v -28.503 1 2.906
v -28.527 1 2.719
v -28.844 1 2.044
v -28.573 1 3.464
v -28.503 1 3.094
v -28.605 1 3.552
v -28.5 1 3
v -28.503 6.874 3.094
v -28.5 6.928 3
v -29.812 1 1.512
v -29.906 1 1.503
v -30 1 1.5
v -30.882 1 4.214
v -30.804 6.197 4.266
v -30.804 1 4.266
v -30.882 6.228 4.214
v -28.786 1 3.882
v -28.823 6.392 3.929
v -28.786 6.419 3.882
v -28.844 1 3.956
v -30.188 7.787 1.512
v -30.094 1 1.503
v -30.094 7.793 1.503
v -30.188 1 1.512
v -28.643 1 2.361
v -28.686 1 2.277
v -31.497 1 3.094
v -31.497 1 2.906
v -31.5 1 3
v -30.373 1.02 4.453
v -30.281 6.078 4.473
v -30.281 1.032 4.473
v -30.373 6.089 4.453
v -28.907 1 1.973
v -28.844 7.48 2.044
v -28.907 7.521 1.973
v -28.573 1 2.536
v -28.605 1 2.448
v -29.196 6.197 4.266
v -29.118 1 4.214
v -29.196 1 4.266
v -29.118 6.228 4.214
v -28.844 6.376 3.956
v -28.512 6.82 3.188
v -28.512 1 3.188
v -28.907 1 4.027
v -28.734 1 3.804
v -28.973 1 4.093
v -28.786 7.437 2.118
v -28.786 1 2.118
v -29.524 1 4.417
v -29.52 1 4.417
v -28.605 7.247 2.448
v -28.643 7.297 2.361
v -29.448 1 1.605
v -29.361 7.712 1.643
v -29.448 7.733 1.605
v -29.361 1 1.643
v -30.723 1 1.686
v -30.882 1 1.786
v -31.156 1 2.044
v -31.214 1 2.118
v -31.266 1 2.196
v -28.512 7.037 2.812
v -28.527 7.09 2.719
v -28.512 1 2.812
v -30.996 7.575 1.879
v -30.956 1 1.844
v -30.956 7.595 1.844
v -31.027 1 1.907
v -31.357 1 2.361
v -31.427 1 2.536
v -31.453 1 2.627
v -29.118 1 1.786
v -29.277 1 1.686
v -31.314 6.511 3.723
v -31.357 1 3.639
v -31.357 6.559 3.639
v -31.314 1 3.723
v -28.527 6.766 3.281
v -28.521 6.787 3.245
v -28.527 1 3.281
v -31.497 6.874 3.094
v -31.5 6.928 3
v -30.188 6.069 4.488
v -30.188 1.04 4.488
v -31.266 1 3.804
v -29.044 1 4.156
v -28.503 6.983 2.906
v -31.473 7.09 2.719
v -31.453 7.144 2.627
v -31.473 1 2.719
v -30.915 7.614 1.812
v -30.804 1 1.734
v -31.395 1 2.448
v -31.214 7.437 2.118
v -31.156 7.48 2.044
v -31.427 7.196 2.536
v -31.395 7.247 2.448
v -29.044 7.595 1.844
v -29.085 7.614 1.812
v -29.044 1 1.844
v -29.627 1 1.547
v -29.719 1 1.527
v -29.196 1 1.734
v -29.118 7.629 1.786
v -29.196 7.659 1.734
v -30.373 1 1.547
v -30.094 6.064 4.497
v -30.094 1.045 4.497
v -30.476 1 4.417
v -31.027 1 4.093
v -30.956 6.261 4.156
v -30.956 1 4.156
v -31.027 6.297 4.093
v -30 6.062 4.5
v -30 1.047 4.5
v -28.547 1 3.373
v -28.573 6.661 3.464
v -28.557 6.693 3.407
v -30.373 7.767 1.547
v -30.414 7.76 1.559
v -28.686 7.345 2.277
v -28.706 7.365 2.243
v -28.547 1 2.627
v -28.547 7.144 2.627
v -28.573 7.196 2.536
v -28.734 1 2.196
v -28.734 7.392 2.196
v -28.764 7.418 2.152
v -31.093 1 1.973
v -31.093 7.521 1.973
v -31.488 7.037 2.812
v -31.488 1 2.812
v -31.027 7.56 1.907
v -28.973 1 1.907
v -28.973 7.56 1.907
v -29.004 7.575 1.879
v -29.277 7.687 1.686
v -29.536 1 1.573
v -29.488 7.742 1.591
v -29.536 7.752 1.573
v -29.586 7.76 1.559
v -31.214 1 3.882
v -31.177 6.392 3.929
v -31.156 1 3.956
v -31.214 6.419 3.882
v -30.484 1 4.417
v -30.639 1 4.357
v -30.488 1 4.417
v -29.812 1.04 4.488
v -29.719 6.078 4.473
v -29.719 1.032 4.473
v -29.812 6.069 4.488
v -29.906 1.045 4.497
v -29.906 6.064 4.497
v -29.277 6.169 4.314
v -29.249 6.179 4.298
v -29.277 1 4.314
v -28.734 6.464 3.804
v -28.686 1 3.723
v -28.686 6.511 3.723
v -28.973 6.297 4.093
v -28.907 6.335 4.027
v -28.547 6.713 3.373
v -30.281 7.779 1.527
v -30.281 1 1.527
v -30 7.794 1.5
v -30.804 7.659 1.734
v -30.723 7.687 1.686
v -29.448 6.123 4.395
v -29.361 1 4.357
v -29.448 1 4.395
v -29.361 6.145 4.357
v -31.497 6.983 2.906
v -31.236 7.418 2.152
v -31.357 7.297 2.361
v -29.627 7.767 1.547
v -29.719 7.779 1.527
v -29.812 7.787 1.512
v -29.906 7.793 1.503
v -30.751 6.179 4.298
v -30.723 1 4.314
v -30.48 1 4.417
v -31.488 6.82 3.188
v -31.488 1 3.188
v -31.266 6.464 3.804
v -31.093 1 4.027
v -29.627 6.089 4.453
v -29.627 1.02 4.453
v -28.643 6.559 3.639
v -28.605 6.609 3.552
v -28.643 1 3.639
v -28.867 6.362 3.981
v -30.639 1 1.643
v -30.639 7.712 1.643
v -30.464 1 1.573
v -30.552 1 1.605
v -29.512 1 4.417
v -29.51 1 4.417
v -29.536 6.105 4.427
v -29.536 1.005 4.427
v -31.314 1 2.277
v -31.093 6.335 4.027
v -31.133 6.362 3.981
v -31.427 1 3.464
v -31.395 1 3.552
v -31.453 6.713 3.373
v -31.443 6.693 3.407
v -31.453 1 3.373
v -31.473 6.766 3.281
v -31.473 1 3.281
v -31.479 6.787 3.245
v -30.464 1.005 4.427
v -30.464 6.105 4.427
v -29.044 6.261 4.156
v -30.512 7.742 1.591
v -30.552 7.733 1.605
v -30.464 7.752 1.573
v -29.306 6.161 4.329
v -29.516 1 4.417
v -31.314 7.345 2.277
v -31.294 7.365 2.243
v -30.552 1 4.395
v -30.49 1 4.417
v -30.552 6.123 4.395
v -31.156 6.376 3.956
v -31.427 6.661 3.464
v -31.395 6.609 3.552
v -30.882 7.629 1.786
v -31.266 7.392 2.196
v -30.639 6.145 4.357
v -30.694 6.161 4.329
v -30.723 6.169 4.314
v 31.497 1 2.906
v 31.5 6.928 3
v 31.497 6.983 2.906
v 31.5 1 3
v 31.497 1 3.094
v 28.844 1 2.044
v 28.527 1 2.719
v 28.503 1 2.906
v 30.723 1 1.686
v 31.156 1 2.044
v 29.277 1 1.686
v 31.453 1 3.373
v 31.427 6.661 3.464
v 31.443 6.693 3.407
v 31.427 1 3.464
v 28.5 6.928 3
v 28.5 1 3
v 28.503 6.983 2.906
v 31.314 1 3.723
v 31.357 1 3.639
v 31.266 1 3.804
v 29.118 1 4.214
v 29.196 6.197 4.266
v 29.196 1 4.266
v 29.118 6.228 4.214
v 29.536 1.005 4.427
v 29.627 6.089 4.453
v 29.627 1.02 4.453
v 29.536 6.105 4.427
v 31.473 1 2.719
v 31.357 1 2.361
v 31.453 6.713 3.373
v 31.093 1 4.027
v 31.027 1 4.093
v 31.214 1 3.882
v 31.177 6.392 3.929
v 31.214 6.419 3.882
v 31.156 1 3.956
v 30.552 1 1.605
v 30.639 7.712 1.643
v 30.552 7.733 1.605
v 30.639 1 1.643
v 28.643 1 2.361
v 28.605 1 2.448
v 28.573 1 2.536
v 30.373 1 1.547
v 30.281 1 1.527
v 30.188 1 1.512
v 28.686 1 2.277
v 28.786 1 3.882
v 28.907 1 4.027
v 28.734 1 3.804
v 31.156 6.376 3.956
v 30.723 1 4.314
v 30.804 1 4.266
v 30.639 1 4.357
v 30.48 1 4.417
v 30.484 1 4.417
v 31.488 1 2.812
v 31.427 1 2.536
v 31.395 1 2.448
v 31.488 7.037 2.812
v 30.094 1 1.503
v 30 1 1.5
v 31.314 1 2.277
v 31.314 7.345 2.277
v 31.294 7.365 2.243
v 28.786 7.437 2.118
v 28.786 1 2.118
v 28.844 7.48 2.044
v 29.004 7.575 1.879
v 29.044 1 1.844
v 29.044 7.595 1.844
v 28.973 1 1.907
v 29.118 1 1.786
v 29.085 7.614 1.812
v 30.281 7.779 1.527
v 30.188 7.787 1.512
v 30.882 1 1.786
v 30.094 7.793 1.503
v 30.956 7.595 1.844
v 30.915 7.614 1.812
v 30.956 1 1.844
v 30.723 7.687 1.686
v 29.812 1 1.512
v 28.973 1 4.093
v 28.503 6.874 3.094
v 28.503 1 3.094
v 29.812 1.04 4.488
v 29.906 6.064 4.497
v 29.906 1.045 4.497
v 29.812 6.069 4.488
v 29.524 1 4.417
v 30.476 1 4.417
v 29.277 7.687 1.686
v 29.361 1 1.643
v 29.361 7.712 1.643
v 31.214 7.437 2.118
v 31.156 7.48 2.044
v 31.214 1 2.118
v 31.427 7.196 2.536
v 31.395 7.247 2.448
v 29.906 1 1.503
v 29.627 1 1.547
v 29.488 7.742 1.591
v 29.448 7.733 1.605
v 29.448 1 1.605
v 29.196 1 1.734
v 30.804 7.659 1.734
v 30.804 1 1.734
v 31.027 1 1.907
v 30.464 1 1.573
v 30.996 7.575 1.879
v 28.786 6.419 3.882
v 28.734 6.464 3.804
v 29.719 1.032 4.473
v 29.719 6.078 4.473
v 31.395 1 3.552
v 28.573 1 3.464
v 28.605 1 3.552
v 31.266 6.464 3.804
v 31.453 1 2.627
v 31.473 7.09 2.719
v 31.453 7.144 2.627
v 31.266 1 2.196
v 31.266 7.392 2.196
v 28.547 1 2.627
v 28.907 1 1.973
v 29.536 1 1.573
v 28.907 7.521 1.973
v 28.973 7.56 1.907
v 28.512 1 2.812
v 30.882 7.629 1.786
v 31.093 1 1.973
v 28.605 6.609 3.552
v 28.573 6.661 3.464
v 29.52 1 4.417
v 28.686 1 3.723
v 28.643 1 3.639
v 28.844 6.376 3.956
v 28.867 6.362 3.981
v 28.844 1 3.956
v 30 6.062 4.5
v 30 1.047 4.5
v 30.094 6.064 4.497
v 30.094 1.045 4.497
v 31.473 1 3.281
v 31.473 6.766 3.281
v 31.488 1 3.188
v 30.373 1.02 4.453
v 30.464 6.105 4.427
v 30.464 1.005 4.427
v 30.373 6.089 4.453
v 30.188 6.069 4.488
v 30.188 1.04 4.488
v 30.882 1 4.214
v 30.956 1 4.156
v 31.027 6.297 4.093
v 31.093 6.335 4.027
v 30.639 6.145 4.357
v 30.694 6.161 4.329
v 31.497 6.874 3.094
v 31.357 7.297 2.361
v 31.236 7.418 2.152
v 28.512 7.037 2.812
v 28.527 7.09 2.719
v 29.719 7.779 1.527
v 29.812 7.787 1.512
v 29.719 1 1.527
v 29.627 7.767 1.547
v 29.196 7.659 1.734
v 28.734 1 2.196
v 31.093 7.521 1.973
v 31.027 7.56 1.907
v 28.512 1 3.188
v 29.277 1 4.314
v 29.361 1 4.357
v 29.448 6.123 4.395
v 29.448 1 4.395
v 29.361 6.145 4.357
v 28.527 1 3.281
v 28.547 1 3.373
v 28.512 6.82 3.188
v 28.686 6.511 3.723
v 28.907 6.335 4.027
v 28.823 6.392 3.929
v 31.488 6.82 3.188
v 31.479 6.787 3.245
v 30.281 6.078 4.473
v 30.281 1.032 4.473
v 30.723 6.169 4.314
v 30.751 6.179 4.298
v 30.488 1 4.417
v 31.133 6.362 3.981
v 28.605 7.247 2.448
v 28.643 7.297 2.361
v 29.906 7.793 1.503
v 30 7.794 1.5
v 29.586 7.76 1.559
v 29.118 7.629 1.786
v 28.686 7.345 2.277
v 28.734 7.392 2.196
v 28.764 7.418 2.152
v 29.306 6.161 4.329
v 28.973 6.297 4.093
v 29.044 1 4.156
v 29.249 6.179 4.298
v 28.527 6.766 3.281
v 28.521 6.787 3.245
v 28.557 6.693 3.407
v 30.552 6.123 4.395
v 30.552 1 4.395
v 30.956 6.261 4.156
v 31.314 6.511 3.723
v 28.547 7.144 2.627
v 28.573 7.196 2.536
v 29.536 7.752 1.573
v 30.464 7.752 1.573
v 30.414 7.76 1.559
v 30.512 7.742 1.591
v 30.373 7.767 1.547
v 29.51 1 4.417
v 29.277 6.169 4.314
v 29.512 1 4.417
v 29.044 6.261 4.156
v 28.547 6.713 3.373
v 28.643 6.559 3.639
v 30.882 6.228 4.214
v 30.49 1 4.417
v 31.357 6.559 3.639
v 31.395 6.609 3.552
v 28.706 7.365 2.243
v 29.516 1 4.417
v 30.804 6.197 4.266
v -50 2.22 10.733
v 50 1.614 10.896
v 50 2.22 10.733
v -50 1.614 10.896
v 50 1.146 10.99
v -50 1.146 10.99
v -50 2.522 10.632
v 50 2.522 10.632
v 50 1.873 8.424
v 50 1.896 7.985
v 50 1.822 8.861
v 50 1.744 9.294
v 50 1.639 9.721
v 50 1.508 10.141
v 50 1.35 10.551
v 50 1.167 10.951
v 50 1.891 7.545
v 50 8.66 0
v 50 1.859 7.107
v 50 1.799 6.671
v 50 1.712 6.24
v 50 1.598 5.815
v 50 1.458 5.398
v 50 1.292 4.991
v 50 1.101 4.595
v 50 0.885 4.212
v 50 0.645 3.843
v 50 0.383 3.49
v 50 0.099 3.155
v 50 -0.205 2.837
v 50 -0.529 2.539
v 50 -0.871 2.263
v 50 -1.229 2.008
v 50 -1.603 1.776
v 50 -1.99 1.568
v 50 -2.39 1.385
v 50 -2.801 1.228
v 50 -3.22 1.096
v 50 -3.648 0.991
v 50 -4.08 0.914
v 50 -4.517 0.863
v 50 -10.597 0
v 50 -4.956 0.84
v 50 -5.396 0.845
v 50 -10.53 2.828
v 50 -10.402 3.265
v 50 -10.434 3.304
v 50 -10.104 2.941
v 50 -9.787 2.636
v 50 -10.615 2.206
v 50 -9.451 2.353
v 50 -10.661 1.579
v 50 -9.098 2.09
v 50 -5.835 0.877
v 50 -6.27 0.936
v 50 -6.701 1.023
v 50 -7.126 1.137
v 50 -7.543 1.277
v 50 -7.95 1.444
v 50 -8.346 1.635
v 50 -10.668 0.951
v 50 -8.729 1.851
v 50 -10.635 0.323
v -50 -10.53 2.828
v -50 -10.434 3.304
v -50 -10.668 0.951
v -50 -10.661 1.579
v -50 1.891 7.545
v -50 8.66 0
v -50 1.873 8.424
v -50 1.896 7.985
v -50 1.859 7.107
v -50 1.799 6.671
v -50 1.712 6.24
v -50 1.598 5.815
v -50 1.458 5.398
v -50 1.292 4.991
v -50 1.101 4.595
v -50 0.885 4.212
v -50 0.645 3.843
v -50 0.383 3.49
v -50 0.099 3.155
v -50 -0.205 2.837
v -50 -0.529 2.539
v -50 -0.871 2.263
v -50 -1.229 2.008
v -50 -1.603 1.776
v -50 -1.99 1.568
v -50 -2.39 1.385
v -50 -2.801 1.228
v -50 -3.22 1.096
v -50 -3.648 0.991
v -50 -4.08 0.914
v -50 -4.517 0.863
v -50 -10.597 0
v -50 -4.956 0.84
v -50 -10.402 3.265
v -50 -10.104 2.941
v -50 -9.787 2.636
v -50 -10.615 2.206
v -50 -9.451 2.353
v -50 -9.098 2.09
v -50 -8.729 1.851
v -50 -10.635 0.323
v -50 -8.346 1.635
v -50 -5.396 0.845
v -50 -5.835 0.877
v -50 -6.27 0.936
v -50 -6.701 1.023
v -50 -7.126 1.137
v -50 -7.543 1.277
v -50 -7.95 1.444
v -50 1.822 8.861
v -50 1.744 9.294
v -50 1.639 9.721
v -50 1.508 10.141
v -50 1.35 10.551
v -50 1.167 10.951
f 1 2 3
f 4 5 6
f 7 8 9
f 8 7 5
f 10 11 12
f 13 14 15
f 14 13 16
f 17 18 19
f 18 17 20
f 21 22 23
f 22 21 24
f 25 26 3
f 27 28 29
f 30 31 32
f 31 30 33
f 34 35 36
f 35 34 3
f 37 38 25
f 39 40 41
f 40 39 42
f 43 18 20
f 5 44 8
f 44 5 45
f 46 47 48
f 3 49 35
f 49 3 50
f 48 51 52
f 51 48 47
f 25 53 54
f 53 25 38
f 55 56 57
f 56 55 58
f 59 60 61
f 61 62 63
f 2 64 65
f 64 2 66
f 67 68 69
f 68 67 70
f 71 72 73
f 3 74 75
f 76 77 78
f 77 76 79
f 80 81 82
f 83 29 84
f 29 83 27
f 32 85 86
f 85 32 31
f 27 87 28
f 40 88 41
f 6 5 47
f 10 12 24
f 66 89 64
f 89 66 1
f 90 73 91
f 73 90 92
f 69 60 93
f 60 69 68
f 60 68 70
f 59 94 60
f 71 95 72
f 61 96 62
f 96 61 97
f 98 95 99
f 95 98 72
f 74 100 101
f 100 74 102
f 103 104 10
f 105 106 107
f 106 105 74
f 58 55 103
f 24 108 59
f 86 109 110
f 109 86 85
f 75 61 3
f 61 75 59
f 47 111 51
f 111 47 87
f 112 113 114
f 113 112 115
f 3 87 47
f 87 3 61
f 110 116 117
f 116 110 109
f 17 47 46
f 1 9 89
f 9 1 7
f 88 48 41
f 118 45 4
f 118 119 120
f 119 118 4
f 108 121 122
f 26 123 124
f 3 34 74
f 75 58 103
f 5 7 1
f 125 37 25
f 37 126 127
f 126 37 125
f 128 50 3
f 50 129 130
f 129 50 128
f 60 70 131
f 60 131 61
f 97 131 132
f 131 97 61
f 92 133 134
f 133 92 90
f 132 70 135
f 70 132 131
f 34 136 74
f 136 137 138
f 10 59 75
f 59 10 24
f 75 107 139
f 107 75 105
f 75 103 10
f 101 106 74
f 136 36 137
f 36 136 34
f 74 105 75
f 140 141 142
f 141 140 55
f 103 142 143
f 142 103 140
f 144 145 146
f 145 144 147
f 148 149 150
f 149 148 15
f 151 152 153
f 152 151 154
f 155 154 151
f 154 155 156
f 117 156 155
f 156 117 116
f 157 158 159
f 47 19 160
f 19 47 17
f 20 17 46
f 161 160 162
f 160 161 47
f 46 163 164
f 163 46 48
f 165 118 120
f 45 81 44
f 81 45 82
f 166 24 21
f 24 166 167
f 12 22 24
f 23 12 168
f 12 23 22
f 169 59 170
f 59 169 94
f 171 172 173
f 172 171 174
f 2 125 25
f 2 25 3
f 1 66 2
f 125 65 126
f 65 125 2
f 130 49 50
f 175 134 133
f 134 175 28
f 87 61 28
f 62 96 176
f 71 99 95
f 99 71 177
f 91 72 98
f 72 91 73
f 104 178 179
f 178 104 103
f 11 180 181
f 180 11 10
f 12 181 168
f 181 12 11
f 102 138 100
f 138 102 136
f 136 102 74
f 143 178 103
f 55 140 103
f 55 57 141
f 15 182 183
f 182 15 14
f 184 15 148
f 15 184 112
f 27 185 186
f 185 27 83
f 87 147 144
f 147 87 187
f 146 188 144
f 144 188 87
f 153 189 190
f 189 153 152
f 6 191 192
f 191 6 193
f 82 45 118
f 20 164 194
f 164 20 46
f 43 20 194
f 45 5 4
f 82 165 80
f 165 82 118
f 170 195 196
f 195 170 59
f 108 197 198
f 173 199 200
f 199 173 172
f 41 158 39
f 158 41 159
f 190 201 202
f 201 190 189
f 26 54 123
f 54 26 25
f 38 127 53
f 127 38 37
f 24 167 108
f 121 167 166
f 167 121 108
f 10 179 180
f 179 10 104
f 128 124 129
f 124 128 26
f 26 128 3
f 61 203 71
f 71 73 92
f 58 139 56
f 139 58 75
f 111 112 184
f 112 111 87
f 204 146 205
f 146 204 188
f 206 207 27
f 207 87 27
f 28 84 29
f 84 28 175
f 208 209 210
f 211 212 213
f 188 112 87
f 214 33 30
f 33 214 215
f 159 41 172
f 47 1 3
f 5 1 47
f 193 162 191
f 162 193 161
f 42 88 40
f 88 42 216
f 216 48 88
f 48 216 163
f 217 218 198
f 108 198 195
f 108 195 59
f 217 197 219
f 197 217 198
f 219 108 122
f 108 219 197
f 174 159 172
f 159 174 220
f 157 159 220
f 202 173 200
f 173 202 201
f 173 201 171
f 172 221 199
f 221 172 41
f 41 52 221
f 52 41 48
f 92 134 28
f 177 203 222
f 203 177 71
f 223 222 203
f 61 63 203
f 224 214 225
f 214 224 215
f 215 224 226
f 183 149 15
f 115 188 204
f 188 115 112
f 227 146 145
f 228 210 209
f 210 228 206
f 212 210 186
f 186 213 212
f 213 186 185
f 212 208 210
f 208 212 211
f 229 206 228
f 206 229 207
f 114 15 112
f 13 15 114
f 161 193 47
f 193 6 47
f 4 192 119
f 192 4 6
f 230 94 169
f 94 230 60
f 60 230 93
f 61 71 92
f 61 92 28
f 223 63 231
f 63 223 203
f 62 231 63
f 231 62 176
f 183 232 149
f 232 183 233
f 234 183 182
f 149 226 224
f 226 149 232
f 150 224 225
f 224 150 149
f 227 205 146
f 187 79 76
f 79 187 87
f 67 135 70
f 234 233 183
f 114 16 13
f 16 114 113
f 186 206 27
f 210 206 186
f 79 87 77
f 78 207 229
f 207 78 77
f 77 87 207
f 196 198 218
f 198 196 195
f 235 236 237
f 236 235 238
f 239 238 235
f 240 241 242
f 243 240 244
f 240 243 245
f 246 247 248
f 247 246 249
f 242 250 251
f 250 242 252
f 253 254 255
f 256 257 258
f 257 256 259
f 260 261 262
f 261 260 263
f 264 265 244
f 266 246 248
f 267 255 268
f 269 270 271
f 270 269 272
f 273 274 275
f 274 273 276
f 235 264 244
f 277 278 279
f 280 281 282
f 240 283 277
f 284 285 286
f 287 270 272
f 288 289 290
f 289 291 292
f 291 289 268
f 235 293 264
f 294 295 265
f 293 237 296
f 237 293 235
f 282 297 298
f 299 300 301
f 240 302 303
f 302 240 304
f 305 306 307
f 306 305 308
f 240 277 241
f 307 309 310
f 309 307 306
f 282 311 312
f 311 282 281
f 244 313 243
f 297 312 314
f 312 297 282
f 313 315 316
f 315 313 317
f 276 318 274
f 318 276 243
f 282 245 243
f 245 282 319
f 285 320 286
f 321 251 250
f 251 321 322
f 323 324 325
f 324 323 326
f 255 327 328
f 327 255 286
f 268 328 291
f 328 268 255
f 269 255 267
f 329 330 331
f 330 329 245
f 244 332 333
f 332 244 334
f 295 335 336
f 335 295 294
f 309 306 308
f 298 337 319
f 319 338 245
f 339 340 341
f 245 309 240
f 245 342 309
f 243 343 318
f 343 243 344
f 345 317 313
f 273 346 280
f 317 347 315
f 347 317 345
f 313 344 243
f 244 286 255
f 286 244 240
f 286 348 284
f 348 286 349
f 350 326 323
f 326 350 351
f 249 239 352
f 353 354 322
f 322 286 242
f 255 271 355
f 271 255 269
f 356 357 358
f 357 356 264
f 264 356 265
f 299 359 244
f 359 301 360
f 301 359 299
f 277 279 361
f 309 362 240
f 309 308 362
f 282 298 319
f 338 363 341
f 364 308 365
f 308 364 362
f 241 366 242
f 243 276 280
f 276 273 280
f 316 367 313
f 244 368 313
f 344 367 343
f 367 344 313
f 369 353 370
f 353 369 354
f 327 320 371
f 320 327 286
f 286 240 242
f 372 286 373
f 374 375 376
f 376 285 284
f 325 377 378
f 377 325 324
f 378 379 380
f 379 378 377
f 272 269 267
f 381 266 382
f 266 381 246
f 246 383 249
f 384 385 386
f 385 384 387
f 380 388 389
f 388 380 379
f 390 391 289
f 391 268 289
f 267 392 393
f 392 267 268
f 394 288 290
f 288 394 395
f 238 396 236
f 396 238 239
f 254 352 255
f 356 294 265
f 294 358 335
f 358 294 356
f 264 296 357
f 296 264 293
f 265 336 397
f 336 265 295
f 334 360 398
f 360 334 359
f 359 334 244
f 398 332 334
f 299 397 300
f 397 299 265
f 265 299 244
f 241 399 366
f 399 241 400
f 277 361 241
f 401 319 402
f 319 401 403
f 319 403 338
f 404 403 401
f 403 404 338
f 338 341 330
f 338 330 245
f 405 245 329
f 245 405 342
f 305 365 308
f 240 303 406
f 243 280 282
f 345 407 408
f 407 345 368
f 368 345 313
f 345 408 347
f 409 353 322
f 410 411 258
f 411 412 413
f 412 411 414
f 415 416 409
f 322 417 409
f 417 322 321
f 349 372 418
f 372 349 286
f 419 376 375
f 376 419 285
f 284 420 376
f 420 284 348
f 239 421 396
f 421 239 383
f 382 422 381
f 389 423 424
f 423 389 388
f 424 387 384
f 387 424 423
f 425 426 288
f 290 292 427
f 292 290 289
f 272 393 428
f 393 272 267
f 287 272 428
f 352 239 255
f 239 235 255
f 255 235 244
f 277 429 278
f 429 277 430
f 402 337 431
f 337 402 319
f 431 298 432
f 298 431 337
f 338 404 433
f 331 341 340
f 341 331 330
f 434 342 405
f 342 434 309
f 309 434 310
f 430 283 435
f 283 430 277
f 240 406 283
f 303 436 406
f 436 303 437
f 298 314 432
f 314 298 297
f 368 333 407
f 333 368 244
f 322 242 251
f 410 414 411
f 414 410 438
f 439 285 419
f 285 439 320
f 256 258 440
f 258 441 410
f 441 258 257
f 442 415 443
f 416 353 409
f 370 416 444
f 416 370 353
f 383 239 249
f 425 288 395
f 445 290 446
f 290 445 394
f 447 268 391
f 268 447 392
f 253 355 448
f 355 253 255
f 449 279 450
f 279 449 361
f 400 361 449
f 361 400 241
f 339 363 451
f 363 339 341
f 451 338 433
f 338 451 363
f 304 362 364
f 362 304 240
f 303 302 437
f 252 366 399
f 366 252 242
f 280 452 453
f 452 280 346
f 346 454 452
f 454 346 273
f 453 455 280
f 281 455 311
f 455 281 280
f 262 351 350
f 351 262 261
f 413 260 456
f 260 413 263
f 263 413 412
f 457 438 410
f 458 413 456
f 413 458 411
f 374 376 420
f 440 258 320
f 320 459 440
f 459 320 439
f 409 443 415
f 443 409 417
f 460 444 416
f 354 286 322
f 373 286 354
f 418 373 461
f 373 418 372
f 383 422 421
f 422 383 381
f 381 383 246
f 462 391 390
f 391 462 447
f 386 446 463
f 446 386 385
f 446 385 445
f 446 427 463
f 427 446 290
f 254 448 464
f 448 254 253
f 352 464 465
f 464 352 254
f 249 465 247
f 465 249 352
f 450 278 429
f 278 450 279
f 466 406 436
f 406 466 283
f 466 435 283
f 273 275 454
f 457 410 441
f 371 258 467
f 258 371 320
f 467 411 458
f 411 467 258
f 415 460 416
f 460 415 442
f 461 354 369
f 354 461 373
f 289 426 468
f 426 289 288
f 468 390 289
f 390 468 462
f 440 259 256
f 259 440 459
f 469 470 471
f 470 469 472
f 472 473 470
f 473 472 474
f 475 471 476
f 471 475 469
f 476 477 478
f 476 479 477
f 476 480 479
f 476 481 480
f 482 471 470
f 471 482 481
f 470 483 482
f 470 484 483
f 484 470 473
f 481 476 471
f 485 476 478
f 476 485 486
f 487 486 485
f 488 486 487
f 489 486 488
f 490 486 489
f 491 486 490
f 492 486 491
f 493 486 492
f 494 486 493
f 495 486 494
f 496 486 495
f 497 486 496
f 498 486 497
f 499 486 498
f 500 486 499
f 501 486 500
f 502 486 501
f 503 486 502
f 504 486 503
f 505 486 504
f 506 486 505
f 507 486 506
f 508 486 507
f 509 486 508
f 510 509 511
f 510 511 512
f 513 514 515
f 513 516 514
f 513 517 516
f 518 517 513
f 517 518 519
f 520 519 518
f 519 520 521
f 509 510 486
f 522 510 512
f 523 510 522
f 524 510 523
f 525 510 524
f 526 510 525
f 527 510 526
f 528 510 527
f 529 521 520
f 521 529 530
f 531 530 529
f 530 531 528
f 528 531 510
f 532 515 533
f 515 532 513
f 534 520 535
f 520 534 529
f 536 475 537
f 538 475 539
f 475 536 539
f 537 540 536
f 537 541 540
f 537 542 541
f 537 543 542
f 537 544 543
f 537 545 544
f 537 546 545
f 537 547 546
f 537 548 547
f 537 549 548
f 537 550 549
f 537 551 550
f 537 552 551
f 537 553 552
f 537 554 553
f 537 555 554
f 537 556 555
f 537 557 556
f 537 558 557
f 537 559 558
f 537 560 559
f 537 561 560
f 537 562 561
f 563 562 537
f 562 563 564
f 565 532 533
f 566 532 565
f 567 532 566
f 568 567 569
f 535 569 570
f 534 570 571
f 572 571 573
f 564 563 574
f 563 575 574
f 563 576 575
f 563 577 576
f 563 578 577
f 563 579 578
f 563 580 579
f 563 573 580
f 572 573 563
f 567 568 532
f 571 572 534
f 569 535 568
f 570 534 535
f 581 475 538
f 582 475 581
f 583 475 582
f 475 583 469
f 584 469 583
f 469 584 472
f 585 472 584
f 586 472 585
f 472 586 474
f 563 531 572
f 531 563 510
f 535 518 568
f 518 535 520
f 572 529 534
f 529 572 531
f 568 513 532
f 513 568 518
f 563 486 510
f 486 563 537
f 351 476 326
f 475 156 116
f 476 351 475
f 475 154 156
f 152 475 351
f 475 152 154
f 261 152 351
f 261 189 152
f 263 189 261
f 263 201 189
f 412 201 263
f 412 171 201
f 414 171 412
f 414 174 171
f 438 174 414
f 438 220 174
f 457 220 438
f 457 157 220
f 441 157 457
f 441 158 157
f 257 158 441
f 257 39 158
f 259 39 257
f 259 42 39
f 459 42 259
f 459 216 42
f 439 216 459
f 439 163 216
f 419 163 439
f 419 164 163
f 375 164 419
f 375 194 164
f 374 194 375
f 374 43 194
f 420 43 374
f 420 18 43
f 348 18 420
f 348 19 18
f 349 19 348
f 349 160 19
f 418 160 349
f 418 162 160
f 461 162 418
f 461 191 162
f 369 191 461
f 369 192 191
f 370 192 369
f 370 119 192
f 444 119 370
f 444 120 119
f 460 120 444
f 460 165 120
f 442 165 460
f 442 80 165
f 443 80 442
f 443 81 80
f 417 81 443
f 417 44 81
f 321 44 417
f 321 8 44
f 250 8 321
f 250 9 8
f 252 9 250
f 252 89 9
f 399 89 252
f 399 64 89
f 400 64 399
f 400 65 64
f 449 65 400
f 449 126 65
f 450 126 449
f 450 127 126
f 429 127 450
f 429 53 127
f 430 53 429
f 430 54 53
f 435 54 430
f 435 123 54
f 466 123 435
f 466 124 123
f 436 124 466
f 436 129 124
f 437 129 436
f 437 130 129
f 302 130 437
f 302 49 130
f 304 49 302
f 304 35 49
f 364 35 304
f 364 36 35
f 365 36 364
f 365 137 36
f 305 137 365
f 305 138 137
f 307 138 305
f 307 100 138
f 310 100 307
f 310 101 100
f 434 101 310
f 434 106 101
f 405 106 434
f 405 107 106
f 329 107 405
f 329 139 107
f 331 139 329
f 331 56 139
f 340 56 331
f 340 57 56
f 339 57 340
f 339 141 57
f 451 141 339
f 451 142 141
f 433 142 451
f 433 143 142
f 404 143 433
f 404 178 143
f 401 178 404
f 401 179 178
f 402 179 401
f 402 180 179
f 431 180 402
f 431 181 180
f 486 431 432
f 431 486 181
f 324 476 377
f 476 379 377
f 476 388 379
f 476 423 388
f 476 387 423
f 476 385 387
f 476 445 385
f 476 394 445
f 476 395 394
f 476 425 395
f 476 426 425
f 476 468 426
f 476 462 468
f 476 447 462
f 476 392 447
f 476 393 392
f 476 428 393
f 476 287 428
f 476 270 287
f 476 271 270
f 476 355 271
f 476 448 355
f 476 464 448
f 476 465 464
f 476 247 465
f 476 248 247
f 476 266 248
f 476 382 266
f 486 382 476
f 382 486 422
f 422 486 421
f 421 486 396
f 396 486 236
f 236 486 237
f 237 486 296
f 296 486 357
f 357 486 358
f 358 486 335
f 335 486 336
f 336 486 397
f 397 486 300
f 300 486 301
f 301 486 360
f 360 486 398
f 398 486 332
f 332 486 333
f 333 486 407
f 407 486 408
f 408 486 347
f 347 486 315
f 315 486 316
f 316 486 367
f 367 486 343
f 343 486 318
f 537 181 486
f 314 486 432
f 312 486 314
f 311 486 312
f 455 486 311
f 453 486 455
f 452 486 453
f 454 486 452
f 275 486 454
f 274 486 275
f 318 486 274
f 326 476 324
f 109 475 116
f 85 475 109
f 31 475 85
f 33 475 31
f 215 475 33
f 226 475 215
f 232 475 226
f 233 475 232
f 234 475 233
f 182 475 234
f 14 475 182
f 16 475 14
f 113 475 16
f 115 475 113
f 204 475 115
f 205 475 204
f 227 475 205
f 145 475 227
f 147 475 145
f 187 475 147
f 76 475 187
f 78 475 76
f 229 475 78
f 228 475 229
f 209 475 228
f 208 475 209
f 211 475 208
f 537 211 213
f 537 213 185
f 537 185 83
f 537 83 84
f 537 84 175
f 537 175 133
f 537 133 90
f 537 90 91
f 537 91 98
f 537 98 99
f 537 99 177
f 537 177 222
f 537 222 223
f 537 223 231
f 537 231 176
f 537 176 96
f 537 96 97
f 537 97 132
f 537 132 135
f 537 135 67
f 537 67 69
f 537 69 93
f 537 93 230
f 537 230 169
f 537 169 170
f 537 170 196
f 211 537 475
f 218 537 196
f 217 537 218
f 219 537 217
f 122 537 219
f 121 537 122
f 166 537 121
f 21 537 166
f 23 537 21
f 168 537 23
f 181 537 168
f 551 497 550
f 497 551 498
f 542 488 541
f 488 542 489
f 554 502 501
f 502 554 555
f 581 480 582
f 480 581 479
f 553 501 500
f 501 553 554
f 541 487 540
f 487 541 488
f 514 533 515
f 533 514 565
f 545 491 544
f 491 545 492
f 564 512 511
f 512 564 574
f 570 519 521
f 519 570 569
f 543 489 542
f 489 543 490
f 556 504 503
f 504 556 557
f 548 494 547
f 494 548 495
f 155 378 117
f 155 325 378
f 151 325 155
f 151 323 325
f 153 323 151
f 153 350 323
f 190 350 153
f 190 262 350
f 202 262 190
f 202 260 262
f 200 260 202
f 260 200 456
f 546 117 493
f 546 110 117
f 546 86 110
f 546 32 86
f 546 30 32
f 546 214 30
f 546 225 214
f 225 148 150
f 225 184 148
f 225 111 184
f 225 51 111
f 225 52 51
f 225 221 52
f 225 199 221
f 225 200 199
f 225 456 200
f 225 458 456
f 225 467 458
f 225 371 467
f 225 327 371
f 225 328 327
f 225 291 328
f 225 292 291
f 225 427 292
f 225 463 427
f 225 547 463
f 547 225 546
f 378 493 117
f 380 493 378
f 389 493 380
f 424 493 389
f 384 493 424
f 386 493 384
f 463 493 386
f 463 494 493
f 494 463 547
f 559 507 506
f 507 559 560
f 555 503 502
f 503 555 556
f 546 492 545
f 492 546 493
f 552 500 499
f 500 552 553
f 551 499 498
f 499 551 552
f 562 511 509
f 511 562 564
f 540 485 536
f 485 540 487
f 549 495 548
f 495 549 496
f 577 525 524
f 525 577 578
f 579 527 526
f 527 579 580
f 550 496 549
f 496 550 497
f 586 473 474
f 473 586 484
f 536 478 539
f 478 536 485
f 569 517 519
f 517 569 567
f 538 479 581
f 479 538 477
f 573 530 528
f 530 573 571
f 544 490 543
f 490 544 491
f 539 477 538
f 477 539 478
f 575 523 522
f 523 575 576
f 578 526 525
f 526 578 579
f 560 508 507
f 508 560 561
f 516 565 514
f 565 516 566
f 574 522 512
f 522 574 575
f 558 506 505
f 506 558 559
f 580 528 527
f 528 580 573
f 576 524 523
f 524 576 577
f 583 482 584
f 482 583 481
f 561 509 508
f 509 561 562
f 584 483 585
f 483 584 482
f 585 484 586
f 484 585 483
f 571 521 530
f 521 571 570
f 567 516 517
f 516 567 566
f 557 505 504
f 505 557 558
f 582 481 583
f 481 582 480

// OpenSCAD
//http://www.thingiverse.com/thing:56236
//by mattjoyce
//customized by Arvin Evans

//length of trough
l1=100;
//magnet radius given as diameter measure. ( /2 in code)
mr=6.25;
//magnet hole depth
md=2;
//outside diameter of cylinder to subtract from and give nice round edges
od=10;
//My additions to mattjoyce's code
withMagnets="no";//[yes:Magnets,no:Pins,other:both]

pinDia=3;//filament pins to attach to a non-magnetic back plate
pinHoleDepth=5;
pinLength=15;

//Pins at the same angle as the back or horizontal to build platform?
perpendicular="false";//[true:90 degrees to back,false:parallel to bottom]
backAngle=60;
placeOnBuildPlatform="true";//[true:Flat to build platform,false:As the Original]

$fn=100;

module track(){
	difference(){
		rotate([0,90,0]) translate([-od,od/2,0]) 
		cylinder(r=od,h=l1);// gives nice round edges
		rotate([backAngle,0,0]) translate([-1,-od,-od]) 
		cube([l1+2,od*2,od*3]);// flattens the bottom
		translate([-1,od+2.5,0]) 
		cube([l1+2,od*2,od*3]);// flattens the back
		rotate([0,90,0]) translate([-18,4.5,-1]) 
		cylinder(r=7,h=l1+2); // the marble trough
	
		if(withMagnets=="yes" || withMagnets=="other"){
			rotate([90,0,0]) translate([l1/5,mr*2,-15+md])// 1/5
			cylinder(r=mr/2,h=md);// (back) magnet hole1
			rotate([90,0,0]) translate([l1/5*2.5,mr*1.5,-15+md])// 2.5/5=1/2 
			cylinder(r=mr/2,h=md);// (middle) magnet hole2
			rotate([90,0,0]) translate([l1/5*4,mr*2,-15+md])// 4/5 
			cylinder(r=mr/2,h=md);// (front) magnet hole3
		}
		if(withMagnets=="no" || withMagnets=="other"){
			if(perpendicular=="true"){// 90 degrees
				rotate([90,0,0]) 
				translate([l1/5,od,-pinLength-pinHoleDepth-1])
#				cylinder(r=pinDia/2,h=pinLength);
			
				rotate([90,0,0]) 
				translate([l1/5*4,od,-pinLength-pinHoleDepth-1]) 
#				cylinder(r=pinDia/2,h=pinLength);

			}else{//angled at backAngle degrees
				rotate([backAngle,0,0]) 
				translate([l1/5,od+pinDia,-pinLength-1])
#				cylinder(r=pinDia/2,h=pinLength);
			
				rotate([backAngle,0,0]) 
				translate([l1/5*4,od+pinDia,-pinLength-1]) 
#				cylinder(r=pinDia/2,h=pinLength);
			}
		}
	}
}

module main(){
  if(placeOnBuildPlatform=="true"){
	translate([-l1/2,0,-od])// move down to platform
	rotate([90-backAngle,0,0])// put the base flat to platform
	track();
  } else {
	track();
  }
}

main();
